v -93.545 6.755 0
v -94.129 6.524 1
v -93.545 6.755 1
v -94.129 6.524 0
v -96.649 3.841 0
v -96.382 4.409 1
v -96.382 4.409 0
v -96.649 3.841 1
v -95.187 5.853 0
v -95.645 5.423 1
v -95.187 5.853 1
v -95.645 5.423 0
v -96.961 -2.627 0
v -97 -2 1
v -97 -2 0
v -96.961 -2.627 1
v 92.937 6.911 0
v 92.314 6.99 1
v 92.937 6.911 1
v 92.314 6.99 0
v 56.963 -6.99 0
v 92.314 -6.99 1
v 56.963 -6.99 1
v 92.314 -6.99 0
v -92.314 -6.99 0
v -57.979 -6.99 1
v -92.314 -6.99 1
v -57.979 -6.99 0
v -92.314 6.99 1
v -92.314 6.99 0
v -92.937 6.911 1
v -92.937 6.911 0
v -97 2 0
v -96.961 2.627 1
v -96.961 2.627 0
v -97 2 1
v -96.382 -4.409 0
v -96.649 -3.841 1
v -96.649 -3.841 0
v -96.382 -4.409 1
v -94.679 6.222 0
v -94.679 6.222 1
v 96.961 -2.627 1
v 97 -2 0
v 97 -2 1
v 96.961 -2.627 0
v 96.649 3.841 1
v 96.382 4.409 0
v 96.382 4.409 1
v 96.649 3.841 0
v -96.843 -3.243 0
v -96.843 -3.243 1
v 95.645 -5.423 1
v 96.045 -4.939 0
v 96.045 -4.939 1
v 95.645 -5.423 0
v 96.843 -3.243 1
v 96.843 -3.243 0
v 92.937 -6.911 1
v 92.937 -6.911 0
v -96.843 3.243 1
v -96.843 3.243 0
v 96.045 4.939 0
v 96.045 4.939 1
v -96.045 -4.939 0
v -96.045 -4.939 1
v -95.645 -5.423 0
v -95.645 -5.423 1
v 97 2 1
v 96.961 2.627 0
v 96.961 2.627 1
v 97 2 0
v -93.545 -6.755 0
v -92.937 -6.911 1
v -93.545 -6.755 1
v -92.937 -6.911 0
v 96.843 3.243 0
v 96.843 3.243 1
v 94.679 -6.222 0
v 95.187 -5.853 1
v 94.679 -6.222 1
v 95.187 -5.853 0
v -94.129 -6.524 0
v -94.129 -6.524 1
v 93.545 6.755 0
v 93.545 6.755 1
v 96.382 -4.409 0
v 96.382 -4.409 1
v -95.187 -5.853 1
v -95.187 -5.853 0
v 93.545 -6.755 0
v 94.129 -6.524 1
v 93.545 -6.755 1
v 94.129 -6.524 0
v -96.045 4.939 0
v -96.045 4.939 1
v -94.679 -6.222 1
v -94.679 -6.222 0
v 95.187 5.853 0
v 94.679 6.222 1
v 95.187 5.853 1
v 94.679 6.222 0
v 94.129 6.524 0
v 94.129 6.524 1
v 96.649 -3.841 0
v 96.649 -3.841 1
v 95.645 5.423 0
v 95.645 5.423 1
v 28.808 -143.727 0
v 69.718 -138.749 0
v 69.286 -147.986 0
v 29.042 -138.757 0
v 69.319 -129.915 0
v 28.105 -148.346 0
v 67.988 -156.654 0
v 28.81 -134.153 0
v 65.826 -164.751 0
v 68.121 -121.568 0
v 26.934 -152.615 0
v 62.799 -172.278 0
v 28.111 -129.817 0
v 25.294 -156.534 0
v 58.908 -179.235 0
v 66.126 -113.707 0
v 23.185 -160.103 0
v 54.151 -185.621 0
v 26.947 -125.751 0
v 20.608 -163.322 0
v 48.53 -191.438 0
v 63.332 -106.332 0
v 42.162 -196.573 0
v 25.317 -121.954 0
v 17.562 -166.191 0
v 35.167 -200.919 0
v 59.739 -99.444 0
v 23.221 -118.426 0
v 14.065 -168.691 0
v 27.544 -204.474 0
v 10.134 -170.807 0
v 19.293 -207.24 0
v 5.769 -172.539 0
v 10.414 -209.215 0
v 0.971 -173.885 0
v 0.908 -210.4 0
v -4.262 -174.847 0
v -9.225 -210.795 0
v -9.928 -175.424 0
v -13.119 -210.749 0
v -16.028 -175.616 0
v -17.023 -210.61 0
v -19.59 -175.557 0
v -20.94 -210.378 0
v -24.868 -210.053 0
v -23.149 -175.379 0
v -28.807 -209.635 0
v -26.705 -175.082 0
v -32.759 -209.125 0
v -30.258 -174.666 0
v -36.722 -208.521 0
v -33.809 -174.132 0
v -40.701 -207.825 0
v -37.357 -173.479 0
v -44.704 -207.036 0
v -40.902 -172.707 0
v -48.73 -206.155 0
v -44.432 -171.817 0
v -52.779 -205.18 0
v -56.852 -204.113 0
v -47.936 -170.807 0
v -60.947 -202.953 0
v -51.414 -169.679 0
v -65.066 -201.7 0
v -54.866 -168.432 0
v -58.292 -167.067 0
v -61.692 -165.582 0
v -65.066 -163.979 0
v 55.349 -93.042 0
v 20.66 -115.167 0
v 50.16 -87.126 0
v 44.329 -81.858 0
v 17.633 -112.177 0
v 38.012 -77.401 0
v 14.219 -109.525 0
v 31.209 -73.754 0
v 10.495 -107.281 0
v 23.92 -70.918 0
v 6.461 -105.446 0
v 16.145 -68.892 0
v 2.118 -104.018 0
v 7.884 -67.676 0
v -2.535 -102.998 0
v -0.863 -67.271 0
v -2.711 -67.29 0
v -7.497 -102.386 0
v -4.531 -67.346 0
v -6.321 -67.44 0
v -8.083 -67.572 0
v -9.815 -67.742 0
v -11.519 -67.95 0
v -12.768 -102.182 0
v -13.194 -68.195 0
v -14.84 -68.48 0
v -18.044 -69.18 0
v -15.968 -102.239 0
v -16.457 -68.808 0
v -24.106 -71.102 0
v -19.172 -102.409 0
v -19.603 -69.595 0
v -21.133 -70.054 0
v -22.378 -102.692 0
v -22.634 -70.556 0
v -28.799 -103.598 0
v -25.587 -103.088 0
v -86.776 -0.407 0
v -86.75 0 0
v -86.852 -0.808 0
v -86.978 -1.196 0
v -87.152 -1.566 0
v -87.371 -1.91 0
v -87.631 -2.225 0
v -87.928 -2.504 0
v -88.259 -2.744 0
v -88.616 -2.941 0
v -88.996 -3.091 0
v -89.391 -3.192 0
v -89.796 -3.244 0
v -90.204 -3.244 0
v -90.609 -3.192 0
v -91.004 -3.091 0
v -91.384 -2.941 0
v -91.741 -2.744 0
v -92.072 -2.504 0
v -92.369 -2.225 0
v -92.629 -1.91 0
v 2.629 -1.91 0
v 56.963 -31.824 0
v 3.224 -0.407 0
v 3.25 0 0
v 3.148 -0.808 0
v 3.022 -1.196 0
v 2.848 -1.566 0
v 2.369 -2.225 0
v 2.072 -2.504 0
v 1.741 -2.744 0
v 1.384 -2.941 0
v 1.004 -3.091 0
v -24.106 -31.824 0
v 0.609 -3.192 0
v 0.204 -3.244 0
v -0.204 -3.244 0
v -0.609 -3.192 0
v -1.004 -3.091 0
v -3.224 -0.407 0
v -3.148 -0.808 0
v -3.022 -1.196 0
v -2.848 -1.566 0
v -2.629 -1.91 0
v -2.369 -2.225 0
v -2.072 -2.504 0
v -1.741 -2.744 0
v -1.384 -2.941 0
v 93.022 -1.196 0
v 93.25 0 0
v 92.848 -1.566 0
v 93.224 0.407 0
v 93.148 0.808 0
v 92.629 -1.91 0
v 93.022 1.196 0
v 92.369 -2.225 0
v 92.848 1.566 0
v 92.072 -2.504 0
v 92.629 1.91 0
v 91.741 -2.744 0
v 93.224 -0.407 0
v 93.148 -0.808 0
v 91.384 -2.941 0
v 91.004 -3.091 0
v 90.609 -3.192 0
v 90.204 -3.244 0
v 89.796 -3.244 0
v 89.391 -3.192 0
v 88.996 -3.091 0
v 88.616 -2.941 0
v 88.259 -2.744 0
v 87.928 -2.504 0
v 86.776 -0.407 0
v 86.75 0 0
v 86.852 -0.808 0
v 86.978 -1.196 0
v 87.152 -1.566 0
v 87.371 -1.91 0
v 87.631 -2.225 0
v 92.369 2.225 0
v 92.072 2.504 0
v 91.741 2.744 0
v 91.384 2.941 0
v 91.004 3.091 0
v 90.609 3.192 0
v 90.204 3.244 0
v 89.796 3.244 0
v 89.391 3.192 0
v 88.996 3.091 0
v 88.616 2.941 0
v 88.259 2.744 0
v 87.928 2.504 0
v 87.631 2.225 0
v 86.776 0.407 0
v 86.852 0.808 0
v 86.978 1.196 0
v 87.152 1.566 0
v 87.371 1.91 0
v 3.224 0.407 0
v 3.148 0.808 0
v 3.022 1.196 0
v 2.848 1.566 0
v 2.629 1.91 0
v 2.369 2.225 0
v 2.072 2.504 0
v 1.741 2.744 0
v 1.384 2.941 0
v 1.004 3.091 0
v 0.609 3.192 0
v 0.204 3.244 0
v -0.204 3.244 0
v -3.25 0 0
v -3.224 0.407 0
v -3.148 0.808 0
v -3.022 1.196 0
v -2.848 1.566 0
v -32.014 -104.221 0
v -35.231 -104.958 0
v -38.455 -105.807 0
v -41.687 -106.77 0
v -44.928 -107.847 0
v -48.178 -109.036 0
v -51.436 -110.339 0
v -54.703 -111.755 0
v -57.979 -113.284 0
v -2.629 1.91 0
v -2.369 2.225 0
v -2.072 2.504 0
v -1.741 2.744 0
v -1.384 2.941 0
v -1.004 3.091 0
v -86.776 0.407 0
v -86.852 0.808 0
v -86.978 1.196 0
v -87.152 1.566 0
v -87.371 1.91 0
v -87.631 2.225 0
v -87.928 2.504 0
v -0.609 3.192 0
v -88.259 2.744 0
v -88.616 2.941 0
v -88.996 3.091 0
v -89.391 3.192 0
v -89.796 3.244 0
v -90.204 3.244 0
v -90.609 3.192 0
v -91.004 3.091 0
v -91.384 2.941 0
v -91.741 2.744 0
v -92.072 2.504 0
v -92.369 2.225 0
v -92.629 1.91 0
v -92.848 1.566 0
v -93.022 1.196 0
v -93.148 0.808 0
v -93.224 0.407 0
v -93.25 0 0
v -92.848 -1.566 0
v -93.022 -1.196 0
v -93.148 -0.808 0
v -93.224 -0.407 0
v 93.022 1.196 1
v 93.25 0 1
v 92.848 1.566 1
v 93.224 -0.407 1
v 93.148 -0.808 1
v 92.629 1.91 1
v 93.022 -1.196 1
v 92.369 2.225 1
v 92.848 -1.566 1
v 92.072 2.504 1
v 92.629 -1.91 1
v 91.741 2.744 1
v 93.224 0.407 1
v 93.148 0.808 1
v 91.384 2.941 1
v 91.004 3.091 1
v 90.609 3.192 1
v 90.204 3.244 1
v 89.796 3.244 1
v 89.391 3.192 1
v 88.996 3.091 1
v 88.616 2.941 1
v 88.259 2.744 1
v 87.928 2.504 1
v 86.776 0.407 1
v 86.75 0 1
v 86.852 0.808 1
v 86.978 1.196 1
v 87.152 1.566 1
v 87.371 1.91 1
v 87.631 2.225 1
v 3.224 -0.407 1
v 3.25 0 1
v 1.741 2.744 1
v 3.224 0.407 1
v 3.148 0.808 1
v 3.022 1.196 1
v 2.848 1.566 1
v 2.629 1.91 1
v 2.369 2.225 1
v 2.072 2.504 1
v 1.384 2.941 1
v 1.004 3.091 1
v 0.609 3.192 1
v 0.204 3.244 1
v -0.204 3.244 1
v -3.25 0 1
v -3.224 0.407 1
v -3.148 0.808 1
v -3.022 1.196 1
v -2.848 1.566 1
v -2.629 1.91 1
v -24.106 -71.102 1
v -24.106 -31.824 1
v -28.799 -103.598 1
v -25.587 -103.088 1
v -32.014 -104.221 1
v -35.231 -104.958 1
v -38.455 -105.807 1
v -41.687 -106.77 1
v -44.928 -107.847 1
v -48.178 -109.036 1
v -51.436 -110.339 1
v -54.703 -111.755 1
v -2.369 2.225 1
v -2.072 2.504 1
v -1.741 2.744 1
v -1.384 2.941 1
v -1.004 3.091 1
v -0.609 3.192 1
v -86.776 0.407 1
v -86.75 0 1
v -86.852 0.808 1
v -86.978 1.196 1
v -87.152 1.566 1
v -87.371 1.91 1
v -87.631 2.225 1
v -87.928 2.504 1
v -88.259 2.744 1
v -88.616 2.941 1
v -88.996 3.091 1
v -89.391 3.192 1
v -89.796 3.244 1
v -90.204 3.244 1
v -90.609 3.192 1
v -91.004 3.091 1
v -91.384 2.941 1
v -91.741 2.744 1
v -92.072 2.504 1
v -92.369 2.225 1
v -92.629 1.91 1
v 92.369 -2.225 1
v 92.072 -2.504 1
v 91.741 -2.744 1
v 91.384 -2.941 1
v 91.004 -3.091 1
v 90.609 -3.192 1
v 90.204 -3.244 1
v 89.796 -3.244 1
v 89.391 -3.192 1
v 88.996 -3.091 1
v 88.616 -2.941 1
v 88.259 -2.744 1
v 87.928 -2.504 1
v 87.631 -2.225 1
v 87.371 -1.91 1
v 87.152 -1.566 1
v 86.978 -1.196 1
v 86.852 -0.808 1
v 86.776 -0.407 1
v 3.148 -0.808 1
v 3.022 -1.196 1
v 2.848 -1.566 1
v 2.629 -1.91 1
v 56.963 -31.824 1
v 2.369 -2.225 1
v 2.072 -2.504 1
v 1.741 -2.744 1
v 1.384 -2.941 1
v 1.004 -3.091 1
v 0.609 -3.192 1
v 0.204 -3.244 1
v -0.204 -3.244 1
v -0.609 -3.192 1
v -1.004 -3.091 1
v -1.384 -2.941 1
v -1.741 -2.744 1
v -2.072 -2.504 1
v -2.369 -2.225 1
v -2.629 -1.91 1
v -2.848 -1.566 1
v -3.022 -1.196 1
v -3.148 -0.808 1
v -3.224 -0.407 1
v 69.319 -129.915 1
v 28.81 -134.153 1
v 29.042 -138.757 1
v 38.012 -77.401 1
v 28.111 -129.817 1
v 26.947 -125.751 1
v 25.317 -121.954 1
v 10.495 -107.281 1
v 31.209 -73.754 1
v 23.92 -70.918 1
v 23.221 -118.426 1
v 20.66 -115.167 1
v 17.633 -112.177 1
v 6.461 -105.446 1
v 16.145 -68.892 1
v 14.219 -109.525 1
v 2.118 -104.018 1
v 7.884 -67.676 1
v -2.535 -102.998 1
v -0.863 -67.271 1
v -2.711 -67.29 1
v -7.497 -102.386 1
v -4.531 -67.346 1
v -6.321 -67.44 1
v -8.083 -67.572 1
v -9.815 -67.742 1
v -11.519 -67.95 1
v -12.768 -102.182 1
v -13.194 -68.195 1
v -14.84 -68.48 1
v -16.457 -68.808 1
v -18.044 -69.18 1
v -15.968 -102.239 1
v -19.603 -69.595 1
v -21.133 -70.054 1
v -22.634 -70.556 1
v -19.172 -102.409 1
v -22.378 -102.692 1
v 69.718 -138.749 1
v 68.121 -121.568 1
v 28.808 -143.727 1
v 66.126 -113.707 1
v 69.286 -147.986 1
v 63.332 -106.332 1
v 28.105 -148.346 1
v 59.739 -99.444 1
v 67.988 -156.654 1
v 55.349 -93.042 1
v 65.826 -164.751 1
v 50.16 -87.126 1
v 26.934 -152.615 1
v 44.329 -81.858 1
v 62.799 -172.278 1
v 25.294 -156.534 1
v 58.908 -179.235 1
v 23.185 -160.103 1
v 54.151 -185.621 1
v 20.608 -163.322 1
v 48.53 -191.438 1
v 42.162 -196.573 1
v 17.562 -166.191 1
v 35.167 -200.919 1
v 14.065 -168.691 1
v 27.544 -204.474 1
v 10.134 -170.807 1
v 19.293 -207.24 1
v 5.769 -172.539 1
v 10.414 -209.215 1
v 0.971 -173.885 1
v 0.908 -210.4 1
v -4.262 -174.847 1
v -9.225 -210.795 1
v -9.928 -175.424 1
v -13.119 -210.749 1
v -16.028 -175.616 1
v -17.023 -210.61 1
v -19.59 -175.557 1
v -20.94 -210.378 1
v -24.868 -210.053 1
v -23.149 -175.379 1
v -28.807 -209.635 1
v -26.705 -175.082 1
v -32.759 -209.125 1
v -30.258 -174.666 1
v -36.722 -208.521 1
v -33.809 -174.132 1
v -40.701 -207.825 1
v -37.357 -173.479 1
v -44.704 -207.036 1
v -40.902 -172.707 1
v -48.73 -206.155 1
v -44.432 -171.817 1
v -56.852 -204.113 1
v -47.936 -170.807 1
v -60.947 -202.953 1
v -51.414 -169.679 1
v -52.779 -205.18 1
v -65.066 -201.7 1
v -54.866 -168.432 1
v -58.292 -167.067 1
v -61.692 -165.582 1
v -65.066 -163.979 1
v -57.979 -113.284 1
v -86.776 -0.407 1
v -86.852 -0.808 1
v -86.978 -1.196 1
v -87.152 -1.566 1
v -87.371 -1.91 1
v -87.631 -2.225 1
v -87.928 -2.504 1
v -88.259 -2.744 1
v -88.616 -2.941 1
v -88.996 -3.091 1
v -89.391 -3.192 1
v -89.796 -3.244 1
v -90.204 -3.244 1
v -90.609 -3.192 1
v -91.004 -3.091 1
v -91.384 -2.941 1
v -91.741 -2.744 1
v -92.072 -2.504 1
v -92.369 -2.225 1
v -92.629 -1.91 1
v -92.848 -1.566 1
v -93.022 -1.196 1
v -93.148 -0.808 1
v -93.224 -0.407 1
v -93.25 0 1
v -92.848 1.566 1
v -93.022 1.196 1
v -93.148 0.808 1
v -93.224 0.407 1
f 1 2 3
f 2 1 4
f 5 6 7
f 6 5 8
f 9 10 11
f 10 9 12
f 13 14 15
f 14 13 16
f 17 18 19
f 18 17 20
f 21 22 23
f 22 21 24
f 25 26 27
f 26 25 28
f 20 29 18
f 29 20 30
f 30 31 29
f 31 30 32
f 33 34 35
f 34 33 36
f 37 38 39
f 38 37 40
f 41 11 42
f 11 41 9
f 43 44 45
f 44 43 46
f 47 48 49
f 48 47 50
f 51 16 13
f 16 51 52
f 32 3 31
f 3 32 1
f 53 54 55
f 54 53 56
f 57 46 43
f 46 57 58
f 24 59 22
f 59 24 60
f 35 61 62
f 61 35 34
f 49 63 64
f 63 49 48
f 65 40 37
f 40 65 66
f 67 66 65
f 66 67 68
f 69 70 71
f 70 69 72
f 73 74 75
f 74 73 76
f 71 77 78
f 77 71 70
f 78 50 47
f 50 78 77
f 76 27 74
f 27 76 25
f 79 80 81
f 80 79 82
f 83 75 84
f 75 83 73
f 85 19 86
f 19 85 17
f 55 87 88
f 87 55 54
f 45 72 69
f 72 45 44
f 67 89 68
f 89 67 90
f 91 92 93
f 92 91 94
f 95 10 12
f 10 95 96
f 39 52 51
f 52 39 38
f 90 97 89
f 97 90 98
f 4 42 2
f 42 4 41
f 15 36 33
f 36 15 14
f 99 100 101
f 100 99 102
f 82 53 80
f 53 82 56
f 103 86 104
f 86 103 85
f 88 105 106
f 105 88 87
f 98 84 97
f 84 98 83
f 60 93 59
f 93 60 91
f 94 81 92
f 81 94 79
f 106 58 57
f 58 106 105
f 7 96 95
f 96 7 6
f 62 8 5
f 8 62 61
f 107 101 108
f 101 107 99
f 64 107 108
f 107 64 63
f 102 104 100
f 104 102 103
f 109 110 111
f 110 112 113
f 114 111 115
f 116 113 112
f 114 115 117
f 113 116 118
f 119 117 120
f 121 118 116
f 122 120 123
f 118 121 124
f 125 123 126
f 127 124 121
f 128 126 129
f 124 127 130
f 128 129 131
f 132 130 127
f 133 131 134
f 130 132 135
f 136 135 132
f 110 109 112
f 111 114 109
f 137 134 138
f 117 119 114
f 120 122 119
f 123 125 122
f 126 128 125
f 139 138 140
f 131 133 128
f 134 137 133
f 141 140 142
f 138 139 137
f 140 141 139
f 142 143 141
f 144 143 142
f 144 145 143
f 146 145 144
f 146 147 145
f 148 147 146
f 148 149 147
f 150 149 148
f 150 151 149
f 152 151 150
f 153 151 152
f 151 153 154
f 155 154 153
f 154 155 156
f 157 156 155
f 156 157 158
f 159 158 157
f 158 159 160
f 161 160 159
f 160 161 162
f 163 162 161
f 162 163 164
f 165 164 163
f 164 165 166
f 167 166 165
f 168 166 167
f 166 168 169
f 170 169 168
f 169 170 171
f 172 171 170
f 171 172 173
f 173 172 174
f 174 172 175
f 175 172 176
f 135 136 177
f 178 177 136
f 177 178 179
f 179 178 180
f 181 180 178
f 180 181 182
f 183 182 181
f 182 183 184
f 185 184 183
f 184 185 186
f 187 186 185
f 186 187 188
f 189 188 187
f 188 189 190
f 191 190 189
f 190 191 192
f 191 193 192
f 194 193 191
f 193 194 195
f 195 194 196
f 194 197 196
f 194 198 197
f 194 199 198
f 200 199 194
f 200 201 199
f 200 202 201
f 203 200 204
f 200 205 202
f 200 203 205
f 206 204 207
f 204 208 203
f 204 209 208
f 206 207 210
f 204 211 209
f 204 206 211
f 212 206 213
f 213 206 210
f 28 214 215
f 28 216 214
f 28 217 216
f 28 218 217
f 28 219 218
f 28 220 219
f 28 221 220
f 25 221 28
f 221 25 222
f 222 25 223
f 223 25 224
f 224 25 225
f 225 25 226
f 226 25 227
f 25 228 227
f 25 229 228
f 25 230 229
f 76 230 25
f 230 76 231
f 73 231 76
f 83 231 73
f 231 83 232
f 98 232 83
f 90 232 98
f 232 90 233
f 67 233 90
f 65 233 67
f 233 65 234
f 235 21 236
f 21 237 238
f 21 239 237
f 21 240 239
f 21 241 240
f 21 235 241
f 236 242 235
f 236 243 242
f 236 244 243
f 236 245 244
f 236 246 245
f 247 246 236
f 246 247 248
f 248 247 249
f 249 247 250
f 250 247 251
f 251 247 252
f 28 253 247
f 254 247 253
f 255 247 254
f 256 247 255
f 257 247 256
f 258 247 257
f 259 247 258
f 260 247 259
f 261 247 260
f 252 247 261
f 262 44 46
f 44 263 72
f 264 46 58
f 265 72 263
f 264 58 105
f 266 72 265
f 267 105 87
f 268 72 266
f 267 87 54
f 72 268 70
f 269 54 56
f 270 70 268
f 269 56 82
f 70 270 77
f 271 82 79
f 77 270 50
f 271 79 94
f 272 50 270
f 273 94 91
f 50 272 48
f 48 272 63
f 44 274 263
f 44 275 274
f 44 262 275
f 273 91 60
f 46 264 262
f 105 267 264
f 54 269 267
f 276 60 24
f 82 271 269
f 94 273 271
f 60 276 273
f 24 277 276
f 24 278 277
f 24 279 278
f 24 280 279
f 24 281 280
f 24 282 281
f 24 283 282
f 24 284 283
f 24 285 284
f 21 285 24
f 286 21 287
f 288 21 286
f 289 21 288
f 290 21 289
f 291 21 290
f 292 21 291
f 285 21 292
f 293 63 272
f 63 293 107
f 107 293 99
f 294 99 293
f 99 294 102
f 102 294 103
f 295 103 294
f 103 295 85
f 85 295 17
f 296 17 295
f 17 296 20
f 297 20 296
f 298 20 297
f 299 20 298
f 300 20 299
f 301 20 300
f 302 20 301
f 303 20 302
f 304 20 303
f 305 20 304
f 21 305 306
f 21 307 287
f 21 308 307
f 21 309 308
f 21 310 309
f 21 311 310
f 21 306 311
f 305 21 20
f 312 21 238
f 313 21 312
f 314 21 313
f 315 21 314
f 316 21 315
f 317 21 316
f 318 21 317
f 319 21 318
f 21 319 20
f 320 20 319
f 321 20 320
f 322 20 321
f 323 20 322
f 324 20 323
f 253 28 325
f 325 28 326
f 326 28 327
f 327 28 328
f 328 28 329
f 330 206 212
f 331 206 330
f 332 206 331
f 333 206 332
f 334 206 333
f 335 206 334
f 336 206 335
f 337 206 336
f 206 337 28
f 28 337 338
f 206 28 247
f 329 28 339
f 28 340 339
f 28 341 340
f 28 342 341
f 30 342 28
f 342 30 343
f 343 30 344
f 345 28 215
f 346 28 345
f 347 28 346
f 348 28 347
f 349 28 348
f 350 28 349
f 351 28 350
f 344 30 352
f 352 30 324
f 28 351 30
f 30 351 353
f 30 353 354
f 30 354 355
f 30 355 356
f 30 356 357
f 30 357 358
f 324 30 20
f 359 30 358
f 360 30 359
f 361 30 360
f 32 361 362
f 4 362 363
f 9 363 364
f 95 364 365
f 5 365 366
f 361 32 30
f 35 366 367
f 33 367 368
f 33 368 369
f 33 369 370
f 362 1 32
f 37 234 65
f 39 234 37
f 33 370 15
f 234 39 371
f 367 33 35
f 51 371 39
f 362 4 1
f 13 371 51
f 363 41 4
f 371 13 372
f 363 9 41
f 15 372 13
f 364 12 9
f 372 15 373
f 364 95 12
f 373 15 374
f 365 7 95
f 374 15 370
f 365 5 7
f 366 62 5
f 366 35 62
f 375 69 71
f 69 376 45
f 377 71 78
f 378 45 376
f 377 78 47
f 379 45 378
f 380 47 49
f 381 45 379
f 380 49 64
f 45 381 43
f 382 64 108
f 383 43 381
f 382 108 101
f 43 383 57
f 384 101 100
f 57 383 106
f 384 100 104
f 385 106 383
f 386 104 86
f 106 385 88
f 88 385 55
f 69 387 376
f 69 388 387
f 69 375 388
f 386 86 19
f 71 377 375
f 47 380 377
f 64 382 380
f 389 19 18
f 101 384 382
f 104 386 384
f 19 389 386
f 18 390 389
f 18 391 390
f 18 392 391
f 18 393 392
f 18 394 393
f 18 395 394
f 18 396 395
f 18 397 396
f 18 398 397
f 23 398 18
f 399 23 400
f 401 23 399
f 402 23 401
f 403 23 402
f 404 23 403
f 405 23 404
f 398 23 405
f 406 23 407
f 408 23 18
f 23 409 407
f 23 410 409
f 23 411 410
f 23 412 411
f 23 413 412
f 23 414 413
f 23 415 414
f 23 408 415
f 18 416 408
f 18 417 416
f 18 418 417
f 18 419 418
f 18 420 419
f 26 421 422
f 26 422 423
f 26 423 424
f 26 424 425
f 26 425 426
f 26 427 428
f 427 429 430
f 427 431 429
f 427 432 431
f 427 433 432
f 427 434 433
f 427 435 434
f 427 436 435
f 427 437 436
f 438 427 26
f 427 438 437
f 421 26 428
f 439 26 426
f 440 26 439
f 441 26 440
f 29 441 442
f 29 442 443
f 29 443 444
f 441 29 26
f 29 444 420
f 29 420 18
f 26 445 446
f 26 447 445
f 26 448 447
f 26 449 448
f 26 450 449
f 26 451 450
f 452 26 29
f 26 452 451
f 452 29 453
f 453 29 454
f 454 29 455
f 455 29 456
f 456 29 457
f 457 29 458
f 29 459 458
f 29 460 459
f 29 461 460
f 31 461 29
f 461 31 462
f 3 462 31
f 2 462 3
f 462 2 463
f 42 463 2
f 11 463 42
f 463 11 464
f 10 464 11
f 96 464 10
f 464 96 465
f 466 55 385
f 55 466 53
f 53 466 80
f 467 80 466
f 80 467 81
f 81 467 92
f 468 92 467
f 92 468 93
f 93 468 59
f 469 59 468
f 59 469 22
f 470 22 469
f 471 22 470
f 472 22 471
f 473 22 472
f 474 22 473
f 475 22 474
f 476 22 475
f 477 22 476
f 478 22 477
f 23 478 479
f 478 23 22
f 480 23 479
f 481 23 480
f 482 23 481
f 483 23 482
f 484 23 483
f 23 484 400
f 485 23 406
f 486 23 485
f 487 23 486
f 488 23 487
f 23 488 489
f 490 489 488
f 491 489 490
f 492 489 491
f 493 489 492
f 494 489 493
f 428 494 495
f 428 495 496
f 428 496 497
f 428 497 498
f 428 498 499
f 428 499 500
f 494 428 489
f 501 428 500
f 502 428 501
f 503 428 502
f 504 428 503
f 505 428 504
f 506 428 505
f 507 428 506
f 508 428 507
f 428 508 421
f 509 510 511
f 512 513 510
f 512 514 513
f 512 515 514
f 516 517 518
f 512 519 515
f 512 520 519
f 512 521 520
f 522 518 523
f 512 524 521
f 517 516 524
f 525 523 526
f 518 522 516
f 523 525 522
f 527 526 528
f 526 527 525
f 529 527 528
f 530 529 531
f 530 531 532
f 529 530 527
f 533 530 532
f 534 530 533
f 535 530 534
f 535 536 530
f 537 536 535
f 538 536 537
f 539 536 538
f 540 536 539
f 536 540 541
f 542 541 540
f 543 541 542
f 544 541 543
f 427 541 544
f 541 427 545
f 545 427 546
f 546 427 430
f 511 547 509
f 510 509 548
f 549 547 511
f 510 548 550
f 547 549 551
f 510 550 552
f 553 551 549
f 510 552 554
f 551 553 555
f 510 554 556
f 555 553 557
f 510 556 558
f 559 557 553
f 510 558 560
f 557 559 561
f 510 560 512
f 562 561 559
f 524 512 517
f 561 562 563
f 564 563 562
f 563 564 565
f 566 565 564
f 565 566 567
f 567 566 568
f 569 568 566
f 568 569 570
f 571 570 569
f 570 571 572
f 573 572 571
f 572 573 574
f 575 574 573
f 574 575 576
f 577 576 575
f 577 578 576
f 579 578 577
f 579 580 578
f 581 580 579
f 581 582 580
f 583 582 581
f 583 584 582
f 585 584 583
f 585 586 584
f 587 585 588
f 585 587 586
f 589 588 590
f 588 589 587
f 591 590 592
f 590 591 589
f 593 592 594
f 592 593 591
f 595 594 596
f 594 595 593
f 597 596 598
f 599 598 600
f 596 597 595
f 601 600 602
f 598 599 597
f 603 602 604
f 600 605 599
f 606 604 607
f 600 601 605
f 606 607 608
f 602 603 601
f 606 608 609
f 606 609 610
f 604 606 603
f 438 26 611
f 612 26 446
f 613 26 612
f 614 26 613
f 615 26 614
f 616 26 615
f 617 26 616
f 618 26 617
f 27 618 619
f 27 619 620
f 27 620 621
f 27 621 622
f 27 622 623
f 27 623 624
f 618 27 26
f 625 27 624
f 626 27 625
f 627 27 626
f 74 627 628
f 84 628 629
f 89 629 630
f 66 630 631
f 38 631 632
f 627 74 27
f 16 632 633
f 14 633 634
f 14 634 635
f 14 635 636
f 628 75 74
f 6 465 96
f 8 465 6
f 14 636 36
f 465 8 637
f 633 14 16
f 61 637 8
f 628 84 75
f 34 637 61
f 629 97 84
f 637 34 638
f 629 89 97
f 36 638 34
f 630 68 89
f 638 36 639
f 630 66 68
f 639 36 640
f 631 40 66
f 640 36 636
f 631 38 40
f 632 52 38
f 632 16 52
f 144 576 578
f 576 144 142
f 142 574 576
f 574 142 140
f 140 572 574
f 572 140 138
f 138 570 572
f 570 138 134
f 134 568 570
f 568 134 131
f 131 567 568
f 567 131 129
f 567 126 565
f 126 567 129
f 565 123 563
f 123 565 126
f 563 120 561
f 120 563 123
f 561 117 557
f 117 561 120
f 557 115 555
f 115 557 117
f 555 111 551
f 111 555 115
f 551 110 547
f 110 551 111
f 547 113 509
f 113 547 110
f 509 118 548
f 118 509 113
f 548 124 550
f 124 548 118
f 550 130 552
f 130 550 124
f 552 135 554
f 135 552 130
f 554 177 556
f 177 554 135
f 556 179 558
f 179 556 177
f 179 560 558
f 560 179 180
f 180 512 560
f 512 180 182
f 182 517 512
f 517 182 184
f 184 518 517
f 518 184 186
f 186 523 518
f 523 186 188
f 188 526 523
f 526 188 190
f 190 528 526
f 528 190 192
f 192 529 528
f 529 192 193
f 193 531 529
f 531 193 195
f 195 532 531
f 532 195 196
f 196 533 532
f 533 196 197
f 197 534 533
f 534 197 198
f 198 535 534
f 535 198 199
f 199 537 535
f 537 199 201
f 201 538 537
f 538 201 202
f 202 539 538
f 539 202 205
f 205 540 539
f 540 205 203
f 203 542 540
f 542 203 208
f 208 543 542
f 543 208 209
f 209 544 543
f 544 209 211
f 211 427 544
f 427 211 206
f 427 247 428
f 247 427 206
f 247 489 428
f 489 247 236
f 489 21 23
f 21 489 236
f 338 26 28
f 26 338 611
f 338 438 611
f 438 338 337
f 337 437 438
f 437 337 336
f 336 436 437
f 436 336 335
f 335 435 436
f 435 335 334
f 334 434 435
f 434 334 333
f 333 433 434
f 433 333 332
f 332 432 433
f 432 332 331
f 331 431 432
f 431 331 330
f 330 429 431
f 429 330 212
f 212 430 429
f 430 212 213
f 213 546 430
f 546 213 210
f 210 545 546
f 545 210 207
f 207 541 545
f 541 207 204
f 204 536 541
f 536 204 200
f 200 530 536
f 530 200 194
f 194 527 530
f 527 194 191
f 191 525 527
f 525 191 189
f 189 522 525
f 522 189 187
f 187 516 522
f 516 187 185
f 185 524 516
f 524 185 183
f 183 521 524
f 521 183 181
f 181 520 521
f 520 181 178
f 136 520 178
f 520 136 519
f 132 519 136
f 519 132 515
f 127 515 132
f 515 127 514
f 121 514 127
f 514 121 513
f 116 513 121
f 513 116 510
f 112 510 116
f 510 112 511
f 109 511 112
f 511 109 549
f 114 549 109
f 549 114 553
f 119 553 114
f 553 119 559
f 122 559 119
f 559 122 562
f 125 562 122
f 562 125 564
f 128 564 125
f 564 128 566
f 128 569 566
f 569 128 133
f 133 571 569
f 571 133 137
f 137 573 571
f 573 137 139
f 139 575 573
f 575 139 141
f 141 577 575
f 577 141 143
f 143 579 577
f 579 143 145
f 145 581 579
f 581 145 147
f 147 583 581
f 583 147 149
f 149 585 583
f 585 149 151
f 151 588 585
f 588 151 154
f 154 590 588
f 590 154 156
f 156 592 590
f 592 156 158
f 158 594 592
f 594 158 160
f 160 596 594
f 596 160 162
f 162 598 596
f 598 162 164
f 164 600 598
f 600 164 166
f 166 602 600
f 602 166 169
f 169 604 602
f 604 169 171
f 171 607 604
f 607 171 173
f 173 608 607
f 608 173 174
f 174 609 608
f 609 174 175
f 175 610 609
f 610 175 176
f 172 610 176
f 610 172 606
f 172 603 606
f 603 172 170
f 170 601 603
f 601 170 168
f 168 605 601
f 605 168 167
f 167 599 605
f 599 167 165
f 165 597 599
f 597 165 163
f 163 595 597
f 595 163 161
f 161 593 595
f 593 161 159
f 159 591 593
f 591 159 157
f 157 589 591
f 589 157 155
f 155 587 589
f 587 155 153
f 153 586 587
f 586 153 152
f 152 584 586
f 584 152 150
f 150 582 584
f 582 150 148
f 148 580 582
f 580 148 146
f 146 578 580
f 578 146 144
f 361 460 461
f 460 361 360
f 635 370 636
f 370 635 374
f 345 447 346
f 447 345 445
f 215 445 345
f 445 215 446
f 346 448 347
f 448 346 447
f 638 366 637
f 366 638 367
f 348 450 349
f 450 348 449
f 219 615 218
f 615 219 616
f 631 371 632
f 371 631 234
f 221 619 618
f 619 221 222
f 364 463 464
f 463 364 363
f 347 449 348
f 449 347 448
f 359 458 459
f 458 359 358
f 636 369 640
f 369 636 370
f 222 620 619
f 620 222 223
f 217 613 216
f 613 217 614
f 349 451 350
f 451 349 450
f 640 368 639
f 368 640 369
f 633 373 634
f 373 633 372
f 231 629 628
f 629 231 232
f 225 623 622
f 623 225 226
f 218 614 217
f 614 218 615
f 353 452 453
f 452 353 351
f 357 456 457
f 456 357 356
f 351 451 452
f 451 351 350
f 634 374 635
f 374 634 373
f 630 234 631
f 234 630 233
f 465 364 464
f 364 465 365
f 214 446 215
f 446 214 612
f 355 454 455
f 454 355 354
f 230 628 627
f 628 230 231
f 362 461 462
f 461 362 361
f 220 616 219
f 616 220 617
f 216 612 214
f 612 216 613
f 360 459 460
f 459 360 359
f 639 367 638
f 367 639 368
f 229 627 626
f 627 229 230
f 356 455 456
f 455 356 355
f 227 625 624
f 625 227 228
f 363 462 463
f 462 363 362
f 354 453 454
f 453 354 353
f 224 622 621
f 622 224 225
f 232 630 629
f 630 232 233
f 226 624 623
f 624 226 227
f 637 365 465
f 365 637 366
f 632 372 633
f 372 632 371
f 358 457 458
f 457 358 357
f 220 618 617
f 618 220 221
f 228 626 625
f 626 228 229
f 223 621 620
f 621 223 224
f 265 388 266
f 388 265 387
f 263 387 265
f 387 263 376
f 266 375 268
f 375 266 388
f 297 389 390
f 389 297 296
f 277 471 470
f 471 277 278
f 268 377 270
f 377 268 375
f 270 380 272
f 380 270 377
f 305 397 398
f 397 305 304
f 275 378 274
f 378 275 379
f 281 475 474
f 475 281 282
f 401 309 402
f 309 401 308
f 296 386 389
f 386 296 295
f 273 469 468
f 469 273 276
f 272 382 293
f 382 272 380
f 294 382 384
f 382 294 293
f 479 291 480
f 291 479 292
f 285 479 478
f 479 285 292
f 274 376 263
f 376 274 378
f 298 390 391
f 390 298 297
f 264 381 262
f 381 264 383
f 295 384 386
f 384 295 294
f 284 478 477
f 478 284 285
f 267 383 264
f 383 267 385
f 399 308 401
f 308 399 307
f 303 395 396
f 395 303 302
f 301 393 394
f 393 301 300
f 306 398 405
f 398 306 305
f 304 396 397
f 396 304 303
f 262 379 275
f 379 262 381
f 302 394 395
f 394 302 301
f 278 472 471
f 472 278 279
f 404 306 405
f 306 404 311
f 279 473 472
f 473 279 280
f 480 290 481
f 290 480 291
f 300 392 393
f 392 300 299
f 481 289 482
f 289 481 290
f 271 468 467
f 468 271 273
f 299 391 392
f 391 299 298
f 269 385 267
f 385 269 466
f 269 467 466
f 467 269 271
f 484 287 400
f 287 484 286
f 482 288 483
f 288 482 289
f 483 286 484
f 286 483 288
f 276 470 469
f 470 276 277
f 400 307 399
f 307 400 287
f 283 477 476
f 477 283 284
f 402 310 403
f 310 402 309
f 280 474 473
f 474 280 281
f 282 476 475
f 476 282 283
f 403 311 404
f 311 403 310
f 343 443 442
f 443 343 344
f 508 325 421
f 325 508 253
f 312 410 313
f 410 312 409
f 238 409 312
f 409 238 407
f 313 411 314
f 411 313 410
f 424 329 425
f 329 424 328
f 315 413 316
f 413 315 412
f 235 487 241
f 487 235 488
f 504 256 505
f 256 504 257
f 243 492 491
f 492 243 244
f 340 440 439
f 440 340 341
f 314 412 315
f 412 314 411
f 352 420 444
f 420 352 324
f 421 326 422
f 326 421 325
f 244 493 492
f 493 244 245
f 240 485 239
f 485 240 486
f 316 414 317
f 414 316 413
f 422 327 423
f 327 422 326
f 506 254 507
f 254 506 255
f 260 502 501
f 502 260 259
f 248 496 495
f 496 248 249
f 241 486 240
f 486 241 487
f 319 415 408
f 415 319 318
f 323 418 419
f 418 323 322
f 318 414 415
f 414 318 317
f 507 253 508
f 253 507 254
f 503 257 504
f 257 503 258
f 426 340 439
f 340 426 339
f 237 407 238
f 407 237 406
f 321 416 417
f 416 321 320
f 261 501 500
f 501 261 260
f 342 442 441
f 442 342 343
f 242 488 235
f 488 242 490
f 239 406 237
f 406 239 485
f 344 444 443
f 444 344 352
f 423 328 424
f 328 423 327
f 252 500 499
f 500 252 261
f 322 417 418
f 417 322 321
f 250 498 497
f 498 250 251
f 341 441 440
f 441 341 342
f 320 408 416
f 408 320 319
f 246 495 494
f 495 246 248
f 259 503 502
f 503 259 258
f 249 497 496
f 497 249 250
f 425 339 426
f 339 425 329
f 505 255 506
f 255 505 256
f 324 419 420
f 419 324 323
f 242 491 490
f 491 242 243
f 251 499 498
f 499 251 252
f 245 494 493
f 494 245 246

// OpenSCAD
$fn = 50;


difference() {
	union() {
		translate(v = [0, 0, 0]) {
			rotate(a = [0, 0, 0]) {
				hull() {
					translate(v = [-92.0000000000, 2.0000000000, 0]) {
						rotate(a = [0, 0, 0]) {
							translate(v = [0, 0, 0]) {
								rotate(a = [0, 0, 0]) {
									cylinder(h = 1, r = 5);
								}
							}
						}
					}
					translate(v = [92.0000000000, 2.0000000000, 0]) {
						rotate(a = [0, 0, 0]) {
							translate(v = [0, 0, 0]) {
								rotate(a = [0, 0, 0]) {
									cylinder(h = 1, r = 5);
								}
							}
						}
					}
					translate(v = [-92.0000000000, -2.0000000000, 0]) {
						rotate(a = [0, 0, 0]) {
							translate(v = [0, 0, 0]) {
								rotate(a = [0, 0, 0]) {
									cylinder(h = 1, r = 5);
								}
							}
						}
					}
					translate(v = [92.0000000000, -2.0000000000, 0]) {
						rotate(a = [0, 0, 0]) {
							translate(v = [0, 0, 0]) {
								rotate(a = [0, 0, 0]) {
									cylinder(h = 1, r = 5);
								}
							}
						}
					}
				}
			}
		}
		translate(v = [0, 0, 0]) {
			rotate(a = [0, 0, 0]) {
				linear_extrude(height = 1) {
					text(font = "DejaVu Sans Mono:style=Bold", halign = "center", size = 209.0000000000, text = "5", valign = "top");
				}
			}
		}
	}
	union() {
		translate(v = [-90.0000000000, 0.0000000000, -125.0000000000]) {
			rotate(a = [0, 0, 0]) {
				cylinder(h = 250, r = 3.2500000000);
			}
		}
		translate(v = [90.0000000000, 0.0000000000, -125.0000000000]) {
			rotate(a = [0, 0, 0]) {
				cylinder(h = 250, r = 3.2500000000);
			}
		}
		translate(v = [90.0000000000, 0.0000000000, -125.0000000000]) {
			rotate(a = [0, 0, 0]) {
				cylinder(h = 250, r = 3.2500000000);
			}
		}
		translate(v = [0, 0, -125.0000000000]) {
			rotate(a = [0, 0, 0]) {
				cylinder(h = 250, r = 3.2500000000);
			}
		}
	}
}
